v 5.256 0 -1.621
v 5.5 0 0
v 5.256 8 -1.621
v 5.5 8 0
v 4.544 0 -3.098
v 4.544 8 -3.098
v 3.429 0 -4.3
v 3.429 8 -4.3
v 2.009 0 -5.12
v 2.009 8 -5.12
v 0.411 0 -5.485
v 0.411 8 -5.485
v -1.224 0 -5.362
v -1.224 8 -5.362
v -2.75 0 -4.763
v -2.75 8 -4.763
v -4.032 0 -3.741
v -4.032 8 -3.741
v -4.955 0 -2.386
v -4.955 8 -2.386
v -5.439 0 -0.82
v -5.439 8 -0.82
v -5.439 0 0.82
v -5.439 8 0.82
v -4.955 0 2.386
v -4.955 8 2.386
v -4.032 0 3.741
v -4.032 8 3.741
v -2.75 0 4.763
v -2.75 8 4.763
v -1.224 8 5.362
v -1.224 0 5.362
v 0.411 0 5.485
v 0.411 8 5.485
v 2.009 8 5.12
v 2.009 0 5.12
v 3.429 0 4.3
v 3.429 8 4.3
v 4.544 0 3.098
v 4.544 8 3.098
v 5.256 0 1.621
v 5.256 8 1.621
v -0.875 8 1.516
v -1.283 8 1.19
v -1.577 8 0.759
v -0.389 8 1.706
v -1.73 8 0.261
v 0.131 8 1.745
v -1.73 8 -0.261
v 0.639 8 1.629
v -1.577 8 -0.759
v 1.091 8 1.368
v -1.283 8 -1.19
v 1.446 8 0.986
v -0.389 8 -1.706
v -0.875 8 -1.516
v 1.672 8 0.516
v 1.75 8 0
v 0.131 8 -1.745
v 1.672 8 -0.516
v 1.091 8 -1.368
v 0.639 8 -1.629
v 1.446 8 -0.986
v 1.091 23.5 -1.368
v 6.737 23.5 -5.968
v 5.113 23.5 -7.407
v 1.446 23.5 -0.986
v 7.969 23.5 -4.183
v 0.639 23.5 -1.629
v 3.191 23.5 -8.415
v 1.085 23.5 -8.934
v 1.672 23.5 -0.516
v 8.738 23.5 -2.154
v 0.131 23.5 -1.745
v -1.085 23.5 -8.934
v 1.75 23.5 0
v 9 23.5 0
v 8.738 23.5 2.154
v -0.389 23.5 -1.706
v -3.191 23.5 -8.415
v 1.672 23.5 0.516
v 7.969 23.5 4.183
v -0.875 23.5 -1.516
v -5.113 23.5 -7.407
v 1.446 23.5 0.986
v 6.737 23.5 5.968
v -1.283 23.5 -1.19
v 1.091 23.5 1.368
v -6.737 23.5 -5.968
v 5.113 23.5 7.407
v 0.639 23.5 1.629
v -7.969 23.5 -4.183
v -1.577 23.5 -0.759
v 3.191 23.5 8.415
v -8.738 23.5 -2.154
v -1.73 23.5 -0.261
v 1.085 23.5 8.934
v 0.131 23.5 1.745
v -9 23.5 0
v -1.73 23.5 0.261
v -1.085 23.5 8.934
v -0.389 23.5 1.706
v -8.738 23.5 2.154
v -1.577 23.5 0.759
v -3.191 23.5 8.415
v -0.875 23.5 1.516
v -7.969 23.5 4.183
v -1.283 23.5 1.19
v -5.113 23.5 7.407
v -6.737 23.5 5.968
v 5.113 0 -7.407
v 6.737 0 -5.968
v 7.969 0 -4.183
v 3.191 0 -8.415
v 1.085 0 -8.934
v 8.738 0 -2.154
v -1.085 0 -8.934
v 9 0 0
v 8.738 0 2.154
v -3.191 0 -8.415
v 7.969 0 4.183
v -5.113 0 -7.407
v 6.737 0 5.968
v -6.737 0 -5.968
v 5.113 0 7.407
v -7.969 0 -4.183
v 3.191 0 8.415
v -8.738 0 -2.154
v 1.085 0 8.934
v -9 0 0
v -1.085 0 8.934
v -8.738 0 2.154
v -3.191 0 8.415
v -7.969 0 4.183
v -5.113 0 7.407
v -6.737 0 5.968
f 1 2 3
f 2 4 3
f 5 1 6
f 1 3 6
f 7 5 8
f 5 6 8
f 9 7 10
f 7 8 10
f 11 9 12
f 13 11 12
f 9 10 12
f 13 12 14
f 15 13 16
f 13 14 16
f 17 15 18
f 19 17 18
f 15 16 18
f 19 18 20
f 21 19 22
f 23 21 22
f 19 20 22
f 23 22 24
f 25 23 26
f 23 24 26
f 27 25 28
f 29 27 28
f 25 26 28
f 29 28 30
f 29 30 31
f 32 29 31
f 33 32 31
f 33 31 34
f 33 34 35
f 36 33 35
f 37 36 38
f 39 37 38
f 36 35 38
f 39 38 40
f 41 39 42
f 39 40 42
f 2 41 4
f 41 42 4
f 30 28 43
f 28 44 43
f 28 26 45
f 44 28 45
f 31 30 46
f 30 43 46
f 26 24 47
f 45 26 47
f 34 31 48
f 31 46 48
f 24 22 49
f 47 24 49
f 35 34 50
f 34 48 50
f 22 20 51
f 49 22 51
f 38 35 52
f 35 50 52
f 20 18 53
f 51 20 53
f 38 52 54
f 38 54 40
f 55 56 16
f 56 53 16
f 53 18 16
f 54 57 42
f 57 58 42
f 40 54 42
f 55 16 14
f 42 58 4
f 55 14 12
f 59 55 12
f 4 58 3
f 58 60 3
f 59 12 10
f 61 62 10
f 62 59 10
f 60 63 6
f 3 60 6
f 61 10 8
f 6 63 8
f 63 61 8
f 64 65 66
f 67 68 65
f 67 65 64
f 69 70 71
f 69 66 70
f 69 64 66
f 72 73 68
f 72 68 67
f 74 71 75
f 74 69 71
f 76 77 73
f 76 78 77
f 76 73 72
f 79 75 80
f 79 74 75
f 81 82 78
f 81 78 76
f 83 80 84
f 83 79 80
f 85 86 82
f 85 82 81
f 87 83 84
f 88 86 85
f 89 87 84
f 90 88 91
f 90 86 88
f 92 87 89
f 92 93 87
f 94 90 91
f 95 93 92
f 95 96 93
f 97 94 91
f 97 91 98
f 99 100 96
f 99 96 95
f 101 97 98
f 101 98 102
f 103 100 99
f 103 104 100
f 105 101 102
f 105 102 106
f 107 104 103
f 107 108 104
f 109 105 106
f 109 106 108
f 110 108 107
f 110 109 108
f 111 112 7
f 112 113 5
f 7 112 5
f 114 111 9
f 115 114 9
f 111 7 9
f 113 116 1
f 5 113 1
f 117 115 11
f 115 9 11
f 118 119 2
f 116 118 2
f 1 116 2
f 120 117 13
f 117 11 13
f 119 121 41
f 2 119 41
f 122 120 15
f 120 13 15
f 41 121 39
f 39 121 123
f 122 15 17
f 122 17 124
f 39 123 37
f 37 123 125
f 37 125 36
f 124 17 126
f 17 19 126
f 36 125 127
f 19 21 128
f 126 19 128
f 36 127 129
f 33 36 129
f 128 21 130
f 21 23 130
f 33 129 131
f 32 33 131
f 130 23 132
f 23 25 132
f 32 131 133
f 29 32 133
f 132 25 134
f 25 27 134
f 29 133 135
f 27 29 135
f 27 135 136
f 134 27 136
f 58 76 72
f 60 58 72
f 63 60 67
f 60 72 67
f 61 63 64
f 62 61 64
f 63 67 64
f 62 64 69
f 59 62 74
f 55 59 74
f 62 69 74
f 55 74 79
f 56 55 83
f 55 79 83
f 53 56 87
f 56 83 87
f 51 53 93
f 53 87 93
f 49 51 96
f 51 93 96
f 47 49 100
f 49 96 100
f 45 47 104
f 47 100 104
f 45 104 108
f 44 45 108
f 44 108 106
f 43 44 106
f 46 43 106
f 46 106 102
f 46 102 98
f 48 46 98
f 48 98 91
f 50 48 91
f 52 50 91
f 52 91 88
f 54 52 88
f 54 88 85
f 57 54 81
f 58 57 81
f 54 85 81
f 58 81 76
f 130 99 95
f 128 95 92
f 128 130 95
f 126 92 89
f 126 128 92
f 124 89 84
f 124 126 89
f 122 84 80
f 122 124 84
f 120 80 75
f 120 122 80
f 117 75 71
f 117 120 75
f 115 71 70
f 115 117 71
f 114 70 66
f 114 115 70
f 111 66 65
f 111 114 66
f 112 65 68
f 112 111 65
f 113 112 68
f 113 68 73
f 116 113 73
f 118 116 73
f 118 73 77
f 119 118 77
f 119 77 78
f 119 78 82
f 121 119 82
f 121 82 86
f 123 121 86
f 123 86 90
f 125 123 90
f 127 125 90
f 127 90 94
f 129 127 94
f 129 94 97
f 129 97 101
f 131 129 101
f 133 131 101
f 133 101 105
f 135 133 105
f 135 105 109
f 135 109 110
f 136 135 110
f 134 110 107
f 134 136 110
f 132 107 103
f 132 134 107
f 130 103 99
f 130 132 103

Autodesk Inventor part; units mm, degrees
ref_plane "YZ Plane" through (0, 0, 0) normal (1, 0, 0) x (0, 1, 0)
ref_plane "XZ Plane" through (0, 0, 0) normal (0, 1, 0) x (-1, 0, 0)
ref_plane "XY Plane" through (0, 0, 0) normal (0, 0, 1) x (1, 0, 0)
sketch "Sketch1" plane through (0, 0, 0) normal (0, 1, 0) x (-1, 0, 0)
  circle A0 centre (0, 0) radius 9
  dimension "d0" = 18
extrude "Extrusion1" add sketch "Sketch1" along normal blind 23.5
sketch "Sketch2" plane through (0, 23.5, 0) normal (0, 1, 0) x (1, 0, 0)
  circle A0 centre (0, 0) radius 5.5
  dimension "d3" = 11
extrude "Extrusion2" cut sketch "Sketch2" against normal up to next
sketch "Sketch3" plane through (0, 23.5, 0) normal (0, 1, 0) x (1, 0, 0)
  circle A0 centre (0, 0) radius 1.75
  circle A1 centre (0, 0) radius 9
  dimension "d6" = 3.5
  dimension "d7" = 18
extrude "Extrusion3" add sketch "Sketch3" against normal blind 15.5
properties part number "Idle_Pulley_Bearing"
